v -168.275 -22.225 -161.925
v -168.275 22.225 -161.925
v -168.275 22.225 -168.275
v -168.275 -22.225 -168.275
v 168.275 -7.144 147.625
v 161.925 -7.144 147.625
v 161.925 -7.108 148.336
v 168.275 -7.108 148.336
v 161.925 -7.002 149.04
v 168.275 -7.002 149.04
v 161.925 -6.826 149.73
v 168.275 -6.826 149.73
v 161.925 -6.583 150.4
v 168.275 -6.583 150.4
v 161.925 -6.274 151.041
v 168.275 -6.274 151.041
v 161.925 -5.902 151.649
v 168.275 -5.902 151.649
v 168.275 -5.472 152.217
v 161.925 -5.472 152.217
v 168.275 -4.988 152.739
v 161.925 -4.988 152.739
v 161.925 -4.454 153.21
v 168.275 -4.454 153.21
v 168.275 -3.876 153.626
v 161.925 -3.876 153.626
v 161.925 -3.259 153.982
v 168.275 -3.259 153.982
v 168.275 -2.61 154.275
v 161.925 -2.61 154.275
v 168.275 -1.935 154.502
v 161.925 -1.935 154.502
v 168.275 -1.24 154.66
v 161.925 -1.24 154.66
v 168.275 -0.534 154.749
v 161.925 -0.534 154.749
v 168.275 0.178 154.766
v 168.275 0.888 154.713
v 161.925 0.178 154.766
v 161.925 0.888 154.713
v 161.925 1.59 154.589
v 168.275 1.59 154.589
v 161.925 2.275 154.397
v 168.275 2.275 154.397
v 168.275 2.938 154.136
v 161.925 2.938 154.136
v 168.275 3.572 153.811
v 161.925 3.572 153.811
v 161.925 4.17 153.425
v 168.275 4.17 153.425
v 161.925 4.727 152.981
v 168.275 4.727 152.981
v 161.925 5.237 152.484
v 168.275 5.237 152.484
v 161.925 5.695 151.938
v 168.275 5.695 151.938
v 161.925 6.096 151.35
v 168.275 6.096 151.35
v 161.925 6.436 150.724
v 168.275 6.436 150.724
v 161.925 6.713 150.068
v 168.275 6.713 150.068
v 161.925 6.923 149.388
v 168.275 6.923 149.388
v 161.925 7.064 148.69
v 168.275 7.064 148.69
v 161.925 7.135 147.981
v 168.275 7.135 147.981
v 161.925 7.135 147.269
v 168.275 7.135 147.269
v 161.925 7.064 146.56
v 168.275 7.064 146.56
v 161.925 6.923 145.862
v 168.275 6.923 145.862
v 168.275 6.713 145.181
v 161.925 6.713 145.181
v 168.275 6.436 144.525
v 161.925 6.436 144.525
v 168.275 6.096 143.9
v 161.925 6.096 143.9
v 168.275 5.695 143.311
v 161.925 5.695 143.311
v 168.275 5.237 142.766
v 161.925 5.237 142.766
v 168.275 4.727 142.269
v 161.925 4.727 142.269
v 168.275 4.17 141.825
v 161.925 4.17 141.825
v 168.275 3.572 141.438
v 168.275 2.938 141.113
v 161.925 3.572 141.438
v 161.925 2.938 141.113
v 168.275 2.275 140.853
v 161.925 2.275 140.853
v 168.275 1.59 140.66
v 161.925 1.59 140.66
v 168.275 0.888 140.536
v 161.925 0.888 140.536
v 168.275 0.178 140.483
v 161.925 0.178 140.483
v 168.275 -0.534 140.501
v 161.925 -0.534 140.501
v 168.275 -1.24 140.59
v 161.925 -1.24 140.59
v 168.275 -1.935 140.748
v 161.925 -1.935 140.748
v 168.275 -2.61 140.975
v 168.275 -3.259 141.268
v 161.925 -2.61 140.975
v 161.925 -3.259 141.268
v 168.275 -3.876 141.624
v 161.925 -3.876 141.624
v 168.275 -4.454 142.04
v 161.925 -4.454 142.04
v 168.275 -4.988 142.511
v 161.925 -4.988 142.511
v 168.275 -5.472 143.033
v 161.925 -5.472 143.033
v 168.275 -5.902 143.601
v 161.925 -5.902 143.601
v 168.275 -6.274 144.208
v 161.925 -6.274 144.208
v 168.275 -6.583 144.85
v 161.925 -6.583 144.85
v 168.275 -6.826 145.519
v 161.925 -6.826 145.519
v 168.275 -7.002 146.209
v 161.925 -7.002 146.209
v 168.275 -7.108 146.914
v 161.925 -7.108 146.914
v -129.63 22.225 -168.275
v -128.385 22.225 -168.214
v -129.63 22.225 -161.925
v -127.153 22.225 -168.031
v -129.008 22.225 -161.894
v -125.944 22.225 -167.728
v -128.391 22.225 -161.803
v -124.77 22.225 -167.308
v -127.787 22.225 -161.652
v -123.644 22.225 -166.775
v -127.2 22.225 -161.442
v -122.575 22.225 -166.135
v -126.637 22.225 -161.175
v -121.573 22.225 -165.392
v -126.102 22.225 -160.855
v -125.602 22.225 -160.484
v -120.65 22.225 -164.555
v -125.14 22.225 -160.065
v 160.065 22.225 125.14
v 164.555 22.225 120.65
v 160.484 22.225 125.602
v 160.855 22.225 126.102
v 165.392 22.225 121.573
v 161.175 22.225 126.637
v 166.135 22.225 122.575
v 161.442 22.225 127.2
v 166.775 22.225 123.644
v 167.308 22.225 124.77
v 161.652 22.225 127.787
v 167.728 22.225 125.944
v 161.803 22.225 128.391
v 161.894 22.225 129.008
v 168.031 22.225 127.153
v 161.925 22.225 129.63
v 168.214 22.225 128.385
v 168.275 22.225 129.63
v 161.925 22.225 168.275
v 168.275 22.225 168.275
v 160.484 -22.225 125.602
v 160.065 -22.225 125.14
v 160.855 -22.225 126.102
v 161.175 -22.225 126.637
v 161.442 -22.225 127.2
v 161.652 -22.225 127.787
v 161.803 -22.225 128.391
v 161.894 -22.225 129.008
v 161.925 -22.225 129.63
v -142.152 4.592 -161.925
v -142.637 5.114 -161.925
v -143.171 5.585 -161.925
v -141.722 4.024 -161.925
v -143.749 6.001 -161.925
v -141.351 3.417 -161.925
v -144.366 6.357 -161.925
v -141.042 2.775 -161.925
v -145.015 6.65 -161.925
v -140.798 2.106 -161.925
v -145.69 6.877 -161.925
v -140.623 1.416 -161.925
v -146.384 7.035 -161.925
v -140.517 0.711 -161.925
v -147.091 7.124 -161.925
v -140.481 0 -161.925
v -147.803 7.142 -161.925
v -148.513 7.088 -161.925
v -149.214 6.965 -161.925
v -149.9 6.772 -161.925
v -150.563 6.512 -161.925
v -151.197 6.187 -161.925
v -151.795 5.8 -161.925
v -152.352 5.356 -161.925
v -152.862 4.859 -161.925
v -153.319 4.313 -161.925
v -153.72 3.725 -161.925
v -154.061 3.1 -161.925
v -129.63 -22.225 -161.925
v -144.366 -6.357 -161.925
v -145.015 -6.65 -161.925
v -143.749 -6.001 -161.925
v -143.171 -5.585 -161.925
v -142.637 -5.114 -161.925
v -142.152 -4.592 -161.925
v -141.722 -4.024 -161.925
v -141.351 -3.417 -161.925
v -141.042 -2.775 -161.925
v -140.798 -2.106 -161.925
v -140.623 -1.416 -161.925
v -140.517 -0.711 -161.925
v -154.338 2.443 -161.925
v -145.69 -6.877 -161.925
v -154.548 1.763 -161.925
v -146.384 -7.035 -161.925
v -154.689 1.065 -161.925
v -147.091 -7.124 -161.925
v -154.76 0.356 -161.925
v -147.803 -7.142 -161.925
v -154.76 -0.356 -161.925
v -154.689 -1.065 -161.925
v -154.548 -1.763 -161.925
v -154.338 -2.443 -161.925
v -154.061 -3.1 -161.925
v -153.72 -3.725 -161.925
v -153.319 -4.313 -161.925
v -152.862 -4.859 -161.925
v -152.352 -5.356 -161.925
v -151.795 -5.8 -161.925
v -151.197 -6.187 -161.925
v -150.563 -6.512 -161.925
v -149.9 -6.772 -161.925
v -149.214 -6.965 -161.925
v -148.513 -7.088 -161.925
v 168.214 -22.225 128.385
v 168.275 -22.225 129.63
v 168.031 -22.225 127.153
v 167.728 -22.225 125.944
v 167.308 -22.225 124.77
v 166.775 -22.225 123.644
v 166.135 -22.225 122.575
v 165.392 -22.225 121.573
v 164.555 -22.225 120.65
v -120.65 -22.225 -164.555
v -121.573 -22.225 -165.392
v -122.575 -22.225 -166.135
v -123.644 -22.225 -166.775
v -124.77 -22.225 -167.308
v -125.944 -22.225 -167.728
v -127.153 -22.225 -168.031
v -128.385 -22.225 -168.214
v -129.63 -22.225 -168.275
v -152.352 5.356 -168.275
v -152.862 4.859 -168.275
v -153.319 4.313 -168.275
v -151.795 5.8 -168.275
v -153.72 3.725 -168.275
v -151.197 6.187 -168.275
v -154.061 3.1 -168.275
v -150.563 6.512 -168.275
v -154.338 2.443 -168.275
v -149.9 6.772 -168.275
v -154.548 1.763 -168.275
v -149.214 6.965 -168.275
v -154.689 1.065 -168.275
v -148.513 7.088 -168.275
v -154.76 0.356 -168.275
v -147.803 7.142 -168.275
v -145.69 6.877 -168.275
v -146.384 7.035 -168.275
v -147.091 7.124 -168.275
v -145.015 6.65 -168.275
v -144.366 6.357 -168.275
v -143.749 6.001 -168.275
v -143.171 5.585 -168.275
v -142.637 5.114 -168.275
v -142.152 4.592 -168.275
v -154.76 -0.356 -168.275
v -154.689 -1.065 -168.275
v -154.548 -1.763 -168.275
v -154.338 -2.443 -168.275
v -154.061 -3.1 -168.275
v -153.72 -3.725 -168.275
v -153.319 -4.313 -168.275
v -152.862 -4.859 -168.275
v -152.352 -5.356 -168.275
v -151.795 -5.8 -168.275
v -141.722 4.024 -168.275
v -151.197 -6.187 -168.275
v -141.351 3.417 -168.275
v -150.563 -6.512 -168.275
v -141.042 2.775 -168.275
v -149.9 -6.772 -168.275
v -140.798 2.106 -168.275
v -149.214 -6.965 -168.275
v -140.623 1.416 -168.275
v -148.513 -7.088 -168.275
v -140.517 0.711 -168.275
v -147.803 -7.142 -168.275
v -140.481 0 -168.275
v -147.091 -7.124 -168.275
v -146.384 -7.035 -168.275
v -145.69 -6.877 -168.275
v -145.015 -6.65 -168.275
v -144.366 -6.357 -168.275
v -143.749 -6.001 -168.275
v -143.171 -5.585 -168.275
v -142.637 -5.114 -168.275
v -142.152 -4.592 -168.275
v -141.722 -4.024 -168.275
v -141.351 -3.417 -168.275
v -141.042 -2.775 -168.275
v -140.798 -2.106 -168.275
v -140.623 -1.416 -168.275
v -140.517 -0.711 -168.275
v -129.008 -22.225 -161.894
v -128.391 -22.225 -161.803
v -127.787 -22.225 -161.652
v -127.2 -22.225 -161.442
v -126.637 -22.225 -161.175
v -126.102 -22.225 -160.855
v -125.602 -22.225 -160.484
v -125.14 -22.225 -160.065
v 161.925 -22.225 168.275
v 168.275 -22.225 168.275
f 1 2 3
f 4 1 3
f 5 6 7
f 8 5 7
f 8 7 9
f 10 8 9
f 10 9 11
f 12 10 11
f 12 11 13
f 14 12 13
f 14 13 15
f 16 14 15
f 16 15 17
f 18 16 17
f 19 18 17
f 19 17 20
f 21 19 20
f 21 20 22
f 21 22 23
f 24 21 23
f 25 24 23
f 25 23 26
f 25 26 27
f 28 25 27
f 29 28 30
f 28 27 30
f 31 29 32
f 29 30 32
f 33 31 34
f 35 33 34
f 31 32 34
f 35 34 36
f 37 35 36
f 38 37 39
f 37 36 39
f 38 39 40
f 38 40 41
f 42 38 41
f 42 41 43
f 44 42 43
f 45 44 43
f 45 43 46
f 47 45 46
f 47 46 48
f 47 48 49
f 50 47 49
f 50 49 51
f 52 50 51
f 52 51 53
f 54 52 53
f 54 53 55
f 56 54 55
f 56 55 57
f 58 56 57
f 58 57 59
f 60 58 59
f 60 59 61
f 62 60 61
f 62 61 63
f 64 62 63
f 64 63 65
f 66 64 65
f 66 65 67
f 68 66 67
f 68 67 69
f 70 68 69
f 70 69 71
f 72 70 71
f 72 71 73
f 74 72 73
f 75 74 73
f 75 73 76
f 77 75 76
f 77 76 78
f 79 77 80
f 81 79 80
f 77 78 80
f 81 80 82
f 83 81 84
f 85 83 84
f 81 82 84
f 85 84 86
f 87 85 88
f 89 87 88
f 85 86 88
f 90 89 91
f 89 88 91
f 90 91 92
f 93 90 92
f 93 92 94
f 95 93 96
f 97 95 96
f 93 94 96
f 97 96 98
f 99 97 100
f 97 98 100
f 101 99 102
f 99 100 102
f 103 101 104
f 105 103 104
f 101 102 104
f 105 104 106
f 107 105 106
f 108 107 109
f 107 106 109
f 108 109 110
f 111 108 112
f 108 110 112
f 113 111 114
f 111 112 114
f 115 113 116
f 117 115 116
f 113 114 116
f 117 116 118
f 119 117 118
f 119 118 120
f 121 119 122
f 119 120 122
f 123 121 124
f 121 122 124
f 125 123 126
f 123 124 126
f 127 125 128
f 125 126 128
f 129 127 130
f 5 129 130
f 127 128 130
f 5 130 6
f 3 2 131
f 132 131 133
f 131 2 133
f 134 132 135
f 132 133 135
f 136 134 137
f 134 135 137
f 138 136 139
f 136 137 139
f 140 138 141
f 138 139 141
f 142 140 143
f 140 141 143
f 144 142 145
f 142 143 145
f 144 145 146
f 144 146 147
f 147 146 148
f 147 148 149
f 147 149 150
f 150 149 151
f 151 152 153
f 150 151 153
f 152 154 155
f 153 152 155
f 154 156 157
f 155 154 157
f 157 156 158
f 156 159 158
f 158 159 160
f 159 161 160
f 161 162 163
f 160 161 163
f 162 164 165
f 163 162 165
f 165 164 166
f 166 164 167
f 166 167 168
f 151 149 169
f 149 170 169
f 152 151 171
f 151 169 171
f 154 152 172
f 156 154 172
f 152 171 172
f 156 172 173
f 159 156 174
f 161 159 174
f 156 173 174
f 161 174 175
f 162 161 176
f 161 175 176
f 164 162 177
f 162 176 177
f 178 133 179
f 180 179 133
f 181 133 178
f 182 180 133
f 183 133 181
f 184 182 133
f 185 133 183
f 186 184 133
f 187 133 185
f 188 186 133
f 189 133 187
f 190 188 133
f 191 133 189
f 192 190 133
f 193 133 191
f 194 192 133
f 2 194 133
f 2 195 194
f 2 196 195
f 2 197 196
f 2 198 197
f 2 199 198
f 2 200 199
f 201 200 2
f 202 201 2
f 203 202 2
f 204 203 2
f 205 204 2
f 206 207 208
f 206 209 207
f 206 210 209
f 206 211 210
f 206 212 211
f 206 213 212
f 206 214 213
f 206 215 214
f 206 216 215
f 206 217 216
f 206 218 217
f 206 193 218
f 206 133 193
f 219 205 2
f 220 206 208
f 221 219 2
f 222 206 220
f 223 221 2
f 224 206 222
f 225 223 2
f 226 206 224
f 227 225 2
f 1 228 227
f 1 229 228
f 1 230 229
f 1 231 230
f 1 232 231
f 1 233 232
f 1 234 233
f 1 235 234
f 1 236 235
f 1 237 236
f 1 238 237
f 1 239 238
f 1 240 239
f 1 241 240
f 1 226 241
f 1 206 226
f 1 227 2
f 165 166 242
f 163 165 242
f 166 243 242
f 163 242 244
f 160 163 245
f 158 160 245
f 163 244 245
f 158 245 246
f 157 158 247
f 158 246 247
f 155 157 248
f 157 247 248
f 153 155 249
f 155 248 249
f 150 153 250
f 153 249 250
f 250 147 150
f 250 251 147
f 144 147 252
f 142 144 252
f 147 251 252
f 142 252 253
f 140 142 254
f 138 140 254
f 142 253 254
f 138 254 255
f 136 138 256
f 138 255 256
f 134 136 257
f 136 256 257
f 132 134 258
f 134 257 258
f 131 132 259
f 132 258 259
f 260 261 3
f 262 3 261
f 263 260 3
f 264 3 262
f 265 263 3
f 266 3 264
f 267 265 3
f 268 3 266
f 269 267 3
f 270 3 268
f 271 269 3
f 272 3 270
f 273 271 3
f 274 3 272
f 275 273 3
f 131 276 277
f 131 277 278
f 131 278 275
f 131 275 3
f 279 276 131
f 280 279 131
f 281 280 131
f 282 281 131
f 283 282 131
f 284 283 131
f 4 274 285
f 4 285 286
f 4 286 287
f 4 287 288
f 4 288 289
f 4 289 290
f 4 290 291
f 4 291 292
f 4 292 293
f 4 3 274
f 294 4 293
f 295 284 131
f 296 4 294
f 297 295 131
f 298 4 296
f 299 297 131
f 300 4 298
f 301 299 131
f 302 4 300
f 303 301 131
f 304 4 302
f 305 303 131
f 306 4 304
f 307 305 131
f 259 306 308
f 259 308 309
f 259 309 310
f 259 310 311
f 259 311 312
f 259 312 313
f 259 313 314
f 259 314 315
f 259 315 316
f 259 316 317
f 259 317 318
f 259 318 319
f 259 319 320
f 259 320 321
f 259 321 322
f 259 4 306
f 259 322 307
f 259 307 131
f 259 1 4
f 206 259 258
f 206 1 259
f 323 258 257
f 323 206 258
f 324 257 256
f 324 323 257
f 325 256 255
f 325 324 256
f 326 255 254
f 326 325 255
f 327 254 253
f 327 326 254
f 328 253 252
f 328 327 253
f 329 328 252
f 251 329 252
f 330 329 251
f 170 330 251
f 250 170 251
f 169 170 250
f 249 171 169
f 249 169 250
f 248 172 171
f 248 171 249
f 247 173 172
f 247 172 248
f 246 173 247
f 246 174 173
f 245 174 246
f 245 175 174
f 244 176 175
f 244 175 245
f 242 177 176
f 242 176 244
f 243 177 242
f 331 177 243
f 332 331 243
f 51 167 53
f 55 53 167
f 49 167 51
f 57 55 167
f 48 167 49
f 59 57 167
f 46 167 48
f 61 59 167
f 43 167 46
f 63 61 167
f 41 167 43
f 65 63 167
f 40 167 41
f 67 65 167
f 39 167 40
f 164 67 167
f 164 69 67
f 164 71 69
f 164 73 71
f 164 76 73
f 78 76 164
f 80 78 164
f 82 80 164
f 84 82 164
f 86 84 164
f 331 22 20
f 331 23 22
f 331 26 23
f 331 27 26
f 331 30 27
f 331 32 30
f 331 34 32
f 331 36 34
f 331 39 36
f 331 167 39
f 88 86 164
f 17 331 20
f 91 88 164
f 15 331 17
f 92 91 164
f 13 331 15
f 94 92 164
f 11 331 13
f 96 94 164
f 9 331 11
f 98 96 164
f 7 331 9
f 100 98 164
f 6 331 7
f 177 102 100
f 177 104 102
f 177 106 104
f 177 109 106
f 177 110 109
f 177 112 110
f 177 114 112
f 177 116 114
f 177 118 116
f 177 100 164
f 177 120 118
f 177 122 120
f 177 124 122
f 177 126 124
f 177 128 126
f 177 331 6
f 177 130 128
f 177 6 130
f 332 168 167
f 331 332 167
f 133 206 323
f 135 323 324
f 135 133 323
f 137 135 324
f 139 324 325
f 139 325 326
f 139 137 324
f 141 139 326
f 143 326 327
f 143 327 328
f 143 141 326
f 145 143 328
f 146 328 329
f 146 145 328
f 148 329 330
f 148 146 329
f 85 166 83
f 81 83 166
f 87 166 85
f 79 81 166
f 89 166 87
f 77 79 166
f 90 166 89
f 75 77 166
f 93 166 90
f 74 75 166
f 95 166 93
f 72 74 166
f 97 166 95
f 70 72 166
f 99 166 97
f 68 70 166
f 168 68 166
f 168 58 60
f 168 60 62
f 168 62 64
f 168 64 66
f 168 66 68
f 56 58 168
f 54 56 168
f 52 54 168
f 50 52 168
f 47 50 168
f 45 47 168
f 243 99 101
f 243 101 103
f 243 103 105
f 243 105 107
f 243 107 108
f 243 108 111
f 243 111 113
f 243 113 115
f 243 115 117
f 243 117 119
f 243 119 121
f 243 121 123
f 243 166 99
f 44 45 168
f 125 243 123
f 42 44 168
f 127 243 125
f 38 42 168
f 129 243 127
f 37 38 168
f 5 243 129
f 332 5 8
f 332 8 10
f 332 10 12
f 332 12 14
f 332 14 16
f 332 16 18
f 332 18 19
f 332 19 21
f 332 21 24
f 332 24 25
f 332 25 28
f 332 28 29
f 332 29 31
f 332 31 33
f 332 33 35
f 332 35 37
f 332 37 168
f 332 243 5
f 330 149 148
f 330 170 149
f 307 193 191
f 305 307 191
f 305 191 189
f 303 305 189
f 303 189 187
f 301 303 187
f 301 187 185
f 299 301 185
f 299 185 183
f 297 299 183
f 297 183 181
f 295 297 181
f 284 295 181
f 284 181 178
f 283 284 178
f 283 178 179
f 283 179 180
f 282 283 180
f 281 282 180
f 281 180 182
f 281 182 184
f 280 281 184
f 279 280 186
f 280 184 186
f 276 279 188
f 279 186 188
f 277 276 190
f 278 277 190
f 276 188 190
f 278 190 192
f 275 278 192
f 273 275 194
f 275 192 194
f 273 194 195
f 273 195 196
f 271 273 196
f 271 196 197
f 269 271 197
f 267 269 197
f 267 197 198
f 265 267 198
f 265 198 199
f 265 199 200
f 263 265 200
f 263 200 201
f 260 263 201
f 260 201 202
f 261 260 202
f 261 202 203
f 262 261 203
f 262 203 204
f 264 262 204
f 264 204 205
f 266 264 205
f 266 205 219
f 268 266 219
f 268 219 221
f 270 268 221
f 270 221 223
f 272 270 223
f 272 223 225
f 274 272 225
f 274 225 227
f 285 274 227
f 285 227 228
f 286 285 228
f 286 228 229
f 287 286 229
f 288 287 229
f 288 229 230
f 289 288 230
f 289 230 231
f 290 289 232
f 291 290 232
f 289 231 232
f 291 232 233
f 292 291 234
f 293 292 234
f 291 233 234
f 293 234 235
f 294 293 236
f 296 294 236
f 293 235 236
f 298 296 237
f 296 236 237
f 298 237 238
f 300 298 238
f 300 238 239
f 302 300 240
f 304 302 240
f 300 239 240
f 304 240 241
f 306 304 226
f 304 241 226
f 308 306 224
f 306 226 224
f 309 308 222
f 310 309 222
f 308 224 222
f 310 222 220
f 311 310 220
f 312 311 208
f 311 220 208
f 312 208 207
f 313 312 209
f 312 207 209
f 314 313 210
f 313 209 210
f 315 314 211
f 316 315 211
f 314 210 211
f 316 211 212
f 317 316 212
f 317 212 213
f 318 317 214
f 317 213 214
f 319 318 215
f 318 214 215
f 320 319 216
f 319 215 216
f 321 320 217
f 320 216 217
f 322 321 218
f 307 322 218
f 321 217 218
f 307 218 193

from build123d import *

# Parameters (mm, degrees)
F1_DEPTH = 22.225
F2_R     = 6.35
F3_R     = 12.7
F4_R     = 7.14375
F5_DEPTH = 25.4
F6_R     = 7.14375
F7_DEPTH = 206.502


with BuildPart() as f1:
    # F0 (on Front) → F1 (new body, symmetric)
    with BuildSketch(Plane.XZ):
        Polygon((-168.275, -168.275), (-124.369744, -168.275), (-124.097372, -168.002628), (168.002628, 124.097372), (168.275, 124.369744), (168.275, 168.275), (161.925, 168.275), (161.925, 127), (-127, -161.925), (-168.275, -161.925), align=None)
    extrude(amount=F1_DEPTH, both=True)

    # F2
    f2_edges = [f1.edges().sort_by_distance(p)[0] for p in [
        (-127, 0, -161.925),
        (161.925, 0, 127),
    ]]
    fillet(f2_edges, radius=F2_R)

    # F3
    f3_edges = [f1.edges().sort_by_distance(p)[0] for p in [
        (-124.369744, 0, -168.275),
        (168.275, 0, 124.369744),
    ]]
    fillet(f3_edges, radius=F3_R)

    # F4 (on face) → F5 (cut)
    with BuildSketch(Plane(origin=(161.925, 0, 0), x_dir=(0, -1, 0), z_dir=(-1, 0, 0))):
        with Locations((0, 147.6248)):
            Circle(F4_R)
    extrude(amount=-F5_DEPTH, mode=Mode.SUBTRACT)

    # F6 (on Top) → F7 (cut)
    with BuildSketch(Plane.XY):
        with Locations((-147.6248, 0)):
            Circle(F6_R)
    extrude(amount=-F7_DEPTH, mode=Mode.SUBTRACT)


solid = f1.part
